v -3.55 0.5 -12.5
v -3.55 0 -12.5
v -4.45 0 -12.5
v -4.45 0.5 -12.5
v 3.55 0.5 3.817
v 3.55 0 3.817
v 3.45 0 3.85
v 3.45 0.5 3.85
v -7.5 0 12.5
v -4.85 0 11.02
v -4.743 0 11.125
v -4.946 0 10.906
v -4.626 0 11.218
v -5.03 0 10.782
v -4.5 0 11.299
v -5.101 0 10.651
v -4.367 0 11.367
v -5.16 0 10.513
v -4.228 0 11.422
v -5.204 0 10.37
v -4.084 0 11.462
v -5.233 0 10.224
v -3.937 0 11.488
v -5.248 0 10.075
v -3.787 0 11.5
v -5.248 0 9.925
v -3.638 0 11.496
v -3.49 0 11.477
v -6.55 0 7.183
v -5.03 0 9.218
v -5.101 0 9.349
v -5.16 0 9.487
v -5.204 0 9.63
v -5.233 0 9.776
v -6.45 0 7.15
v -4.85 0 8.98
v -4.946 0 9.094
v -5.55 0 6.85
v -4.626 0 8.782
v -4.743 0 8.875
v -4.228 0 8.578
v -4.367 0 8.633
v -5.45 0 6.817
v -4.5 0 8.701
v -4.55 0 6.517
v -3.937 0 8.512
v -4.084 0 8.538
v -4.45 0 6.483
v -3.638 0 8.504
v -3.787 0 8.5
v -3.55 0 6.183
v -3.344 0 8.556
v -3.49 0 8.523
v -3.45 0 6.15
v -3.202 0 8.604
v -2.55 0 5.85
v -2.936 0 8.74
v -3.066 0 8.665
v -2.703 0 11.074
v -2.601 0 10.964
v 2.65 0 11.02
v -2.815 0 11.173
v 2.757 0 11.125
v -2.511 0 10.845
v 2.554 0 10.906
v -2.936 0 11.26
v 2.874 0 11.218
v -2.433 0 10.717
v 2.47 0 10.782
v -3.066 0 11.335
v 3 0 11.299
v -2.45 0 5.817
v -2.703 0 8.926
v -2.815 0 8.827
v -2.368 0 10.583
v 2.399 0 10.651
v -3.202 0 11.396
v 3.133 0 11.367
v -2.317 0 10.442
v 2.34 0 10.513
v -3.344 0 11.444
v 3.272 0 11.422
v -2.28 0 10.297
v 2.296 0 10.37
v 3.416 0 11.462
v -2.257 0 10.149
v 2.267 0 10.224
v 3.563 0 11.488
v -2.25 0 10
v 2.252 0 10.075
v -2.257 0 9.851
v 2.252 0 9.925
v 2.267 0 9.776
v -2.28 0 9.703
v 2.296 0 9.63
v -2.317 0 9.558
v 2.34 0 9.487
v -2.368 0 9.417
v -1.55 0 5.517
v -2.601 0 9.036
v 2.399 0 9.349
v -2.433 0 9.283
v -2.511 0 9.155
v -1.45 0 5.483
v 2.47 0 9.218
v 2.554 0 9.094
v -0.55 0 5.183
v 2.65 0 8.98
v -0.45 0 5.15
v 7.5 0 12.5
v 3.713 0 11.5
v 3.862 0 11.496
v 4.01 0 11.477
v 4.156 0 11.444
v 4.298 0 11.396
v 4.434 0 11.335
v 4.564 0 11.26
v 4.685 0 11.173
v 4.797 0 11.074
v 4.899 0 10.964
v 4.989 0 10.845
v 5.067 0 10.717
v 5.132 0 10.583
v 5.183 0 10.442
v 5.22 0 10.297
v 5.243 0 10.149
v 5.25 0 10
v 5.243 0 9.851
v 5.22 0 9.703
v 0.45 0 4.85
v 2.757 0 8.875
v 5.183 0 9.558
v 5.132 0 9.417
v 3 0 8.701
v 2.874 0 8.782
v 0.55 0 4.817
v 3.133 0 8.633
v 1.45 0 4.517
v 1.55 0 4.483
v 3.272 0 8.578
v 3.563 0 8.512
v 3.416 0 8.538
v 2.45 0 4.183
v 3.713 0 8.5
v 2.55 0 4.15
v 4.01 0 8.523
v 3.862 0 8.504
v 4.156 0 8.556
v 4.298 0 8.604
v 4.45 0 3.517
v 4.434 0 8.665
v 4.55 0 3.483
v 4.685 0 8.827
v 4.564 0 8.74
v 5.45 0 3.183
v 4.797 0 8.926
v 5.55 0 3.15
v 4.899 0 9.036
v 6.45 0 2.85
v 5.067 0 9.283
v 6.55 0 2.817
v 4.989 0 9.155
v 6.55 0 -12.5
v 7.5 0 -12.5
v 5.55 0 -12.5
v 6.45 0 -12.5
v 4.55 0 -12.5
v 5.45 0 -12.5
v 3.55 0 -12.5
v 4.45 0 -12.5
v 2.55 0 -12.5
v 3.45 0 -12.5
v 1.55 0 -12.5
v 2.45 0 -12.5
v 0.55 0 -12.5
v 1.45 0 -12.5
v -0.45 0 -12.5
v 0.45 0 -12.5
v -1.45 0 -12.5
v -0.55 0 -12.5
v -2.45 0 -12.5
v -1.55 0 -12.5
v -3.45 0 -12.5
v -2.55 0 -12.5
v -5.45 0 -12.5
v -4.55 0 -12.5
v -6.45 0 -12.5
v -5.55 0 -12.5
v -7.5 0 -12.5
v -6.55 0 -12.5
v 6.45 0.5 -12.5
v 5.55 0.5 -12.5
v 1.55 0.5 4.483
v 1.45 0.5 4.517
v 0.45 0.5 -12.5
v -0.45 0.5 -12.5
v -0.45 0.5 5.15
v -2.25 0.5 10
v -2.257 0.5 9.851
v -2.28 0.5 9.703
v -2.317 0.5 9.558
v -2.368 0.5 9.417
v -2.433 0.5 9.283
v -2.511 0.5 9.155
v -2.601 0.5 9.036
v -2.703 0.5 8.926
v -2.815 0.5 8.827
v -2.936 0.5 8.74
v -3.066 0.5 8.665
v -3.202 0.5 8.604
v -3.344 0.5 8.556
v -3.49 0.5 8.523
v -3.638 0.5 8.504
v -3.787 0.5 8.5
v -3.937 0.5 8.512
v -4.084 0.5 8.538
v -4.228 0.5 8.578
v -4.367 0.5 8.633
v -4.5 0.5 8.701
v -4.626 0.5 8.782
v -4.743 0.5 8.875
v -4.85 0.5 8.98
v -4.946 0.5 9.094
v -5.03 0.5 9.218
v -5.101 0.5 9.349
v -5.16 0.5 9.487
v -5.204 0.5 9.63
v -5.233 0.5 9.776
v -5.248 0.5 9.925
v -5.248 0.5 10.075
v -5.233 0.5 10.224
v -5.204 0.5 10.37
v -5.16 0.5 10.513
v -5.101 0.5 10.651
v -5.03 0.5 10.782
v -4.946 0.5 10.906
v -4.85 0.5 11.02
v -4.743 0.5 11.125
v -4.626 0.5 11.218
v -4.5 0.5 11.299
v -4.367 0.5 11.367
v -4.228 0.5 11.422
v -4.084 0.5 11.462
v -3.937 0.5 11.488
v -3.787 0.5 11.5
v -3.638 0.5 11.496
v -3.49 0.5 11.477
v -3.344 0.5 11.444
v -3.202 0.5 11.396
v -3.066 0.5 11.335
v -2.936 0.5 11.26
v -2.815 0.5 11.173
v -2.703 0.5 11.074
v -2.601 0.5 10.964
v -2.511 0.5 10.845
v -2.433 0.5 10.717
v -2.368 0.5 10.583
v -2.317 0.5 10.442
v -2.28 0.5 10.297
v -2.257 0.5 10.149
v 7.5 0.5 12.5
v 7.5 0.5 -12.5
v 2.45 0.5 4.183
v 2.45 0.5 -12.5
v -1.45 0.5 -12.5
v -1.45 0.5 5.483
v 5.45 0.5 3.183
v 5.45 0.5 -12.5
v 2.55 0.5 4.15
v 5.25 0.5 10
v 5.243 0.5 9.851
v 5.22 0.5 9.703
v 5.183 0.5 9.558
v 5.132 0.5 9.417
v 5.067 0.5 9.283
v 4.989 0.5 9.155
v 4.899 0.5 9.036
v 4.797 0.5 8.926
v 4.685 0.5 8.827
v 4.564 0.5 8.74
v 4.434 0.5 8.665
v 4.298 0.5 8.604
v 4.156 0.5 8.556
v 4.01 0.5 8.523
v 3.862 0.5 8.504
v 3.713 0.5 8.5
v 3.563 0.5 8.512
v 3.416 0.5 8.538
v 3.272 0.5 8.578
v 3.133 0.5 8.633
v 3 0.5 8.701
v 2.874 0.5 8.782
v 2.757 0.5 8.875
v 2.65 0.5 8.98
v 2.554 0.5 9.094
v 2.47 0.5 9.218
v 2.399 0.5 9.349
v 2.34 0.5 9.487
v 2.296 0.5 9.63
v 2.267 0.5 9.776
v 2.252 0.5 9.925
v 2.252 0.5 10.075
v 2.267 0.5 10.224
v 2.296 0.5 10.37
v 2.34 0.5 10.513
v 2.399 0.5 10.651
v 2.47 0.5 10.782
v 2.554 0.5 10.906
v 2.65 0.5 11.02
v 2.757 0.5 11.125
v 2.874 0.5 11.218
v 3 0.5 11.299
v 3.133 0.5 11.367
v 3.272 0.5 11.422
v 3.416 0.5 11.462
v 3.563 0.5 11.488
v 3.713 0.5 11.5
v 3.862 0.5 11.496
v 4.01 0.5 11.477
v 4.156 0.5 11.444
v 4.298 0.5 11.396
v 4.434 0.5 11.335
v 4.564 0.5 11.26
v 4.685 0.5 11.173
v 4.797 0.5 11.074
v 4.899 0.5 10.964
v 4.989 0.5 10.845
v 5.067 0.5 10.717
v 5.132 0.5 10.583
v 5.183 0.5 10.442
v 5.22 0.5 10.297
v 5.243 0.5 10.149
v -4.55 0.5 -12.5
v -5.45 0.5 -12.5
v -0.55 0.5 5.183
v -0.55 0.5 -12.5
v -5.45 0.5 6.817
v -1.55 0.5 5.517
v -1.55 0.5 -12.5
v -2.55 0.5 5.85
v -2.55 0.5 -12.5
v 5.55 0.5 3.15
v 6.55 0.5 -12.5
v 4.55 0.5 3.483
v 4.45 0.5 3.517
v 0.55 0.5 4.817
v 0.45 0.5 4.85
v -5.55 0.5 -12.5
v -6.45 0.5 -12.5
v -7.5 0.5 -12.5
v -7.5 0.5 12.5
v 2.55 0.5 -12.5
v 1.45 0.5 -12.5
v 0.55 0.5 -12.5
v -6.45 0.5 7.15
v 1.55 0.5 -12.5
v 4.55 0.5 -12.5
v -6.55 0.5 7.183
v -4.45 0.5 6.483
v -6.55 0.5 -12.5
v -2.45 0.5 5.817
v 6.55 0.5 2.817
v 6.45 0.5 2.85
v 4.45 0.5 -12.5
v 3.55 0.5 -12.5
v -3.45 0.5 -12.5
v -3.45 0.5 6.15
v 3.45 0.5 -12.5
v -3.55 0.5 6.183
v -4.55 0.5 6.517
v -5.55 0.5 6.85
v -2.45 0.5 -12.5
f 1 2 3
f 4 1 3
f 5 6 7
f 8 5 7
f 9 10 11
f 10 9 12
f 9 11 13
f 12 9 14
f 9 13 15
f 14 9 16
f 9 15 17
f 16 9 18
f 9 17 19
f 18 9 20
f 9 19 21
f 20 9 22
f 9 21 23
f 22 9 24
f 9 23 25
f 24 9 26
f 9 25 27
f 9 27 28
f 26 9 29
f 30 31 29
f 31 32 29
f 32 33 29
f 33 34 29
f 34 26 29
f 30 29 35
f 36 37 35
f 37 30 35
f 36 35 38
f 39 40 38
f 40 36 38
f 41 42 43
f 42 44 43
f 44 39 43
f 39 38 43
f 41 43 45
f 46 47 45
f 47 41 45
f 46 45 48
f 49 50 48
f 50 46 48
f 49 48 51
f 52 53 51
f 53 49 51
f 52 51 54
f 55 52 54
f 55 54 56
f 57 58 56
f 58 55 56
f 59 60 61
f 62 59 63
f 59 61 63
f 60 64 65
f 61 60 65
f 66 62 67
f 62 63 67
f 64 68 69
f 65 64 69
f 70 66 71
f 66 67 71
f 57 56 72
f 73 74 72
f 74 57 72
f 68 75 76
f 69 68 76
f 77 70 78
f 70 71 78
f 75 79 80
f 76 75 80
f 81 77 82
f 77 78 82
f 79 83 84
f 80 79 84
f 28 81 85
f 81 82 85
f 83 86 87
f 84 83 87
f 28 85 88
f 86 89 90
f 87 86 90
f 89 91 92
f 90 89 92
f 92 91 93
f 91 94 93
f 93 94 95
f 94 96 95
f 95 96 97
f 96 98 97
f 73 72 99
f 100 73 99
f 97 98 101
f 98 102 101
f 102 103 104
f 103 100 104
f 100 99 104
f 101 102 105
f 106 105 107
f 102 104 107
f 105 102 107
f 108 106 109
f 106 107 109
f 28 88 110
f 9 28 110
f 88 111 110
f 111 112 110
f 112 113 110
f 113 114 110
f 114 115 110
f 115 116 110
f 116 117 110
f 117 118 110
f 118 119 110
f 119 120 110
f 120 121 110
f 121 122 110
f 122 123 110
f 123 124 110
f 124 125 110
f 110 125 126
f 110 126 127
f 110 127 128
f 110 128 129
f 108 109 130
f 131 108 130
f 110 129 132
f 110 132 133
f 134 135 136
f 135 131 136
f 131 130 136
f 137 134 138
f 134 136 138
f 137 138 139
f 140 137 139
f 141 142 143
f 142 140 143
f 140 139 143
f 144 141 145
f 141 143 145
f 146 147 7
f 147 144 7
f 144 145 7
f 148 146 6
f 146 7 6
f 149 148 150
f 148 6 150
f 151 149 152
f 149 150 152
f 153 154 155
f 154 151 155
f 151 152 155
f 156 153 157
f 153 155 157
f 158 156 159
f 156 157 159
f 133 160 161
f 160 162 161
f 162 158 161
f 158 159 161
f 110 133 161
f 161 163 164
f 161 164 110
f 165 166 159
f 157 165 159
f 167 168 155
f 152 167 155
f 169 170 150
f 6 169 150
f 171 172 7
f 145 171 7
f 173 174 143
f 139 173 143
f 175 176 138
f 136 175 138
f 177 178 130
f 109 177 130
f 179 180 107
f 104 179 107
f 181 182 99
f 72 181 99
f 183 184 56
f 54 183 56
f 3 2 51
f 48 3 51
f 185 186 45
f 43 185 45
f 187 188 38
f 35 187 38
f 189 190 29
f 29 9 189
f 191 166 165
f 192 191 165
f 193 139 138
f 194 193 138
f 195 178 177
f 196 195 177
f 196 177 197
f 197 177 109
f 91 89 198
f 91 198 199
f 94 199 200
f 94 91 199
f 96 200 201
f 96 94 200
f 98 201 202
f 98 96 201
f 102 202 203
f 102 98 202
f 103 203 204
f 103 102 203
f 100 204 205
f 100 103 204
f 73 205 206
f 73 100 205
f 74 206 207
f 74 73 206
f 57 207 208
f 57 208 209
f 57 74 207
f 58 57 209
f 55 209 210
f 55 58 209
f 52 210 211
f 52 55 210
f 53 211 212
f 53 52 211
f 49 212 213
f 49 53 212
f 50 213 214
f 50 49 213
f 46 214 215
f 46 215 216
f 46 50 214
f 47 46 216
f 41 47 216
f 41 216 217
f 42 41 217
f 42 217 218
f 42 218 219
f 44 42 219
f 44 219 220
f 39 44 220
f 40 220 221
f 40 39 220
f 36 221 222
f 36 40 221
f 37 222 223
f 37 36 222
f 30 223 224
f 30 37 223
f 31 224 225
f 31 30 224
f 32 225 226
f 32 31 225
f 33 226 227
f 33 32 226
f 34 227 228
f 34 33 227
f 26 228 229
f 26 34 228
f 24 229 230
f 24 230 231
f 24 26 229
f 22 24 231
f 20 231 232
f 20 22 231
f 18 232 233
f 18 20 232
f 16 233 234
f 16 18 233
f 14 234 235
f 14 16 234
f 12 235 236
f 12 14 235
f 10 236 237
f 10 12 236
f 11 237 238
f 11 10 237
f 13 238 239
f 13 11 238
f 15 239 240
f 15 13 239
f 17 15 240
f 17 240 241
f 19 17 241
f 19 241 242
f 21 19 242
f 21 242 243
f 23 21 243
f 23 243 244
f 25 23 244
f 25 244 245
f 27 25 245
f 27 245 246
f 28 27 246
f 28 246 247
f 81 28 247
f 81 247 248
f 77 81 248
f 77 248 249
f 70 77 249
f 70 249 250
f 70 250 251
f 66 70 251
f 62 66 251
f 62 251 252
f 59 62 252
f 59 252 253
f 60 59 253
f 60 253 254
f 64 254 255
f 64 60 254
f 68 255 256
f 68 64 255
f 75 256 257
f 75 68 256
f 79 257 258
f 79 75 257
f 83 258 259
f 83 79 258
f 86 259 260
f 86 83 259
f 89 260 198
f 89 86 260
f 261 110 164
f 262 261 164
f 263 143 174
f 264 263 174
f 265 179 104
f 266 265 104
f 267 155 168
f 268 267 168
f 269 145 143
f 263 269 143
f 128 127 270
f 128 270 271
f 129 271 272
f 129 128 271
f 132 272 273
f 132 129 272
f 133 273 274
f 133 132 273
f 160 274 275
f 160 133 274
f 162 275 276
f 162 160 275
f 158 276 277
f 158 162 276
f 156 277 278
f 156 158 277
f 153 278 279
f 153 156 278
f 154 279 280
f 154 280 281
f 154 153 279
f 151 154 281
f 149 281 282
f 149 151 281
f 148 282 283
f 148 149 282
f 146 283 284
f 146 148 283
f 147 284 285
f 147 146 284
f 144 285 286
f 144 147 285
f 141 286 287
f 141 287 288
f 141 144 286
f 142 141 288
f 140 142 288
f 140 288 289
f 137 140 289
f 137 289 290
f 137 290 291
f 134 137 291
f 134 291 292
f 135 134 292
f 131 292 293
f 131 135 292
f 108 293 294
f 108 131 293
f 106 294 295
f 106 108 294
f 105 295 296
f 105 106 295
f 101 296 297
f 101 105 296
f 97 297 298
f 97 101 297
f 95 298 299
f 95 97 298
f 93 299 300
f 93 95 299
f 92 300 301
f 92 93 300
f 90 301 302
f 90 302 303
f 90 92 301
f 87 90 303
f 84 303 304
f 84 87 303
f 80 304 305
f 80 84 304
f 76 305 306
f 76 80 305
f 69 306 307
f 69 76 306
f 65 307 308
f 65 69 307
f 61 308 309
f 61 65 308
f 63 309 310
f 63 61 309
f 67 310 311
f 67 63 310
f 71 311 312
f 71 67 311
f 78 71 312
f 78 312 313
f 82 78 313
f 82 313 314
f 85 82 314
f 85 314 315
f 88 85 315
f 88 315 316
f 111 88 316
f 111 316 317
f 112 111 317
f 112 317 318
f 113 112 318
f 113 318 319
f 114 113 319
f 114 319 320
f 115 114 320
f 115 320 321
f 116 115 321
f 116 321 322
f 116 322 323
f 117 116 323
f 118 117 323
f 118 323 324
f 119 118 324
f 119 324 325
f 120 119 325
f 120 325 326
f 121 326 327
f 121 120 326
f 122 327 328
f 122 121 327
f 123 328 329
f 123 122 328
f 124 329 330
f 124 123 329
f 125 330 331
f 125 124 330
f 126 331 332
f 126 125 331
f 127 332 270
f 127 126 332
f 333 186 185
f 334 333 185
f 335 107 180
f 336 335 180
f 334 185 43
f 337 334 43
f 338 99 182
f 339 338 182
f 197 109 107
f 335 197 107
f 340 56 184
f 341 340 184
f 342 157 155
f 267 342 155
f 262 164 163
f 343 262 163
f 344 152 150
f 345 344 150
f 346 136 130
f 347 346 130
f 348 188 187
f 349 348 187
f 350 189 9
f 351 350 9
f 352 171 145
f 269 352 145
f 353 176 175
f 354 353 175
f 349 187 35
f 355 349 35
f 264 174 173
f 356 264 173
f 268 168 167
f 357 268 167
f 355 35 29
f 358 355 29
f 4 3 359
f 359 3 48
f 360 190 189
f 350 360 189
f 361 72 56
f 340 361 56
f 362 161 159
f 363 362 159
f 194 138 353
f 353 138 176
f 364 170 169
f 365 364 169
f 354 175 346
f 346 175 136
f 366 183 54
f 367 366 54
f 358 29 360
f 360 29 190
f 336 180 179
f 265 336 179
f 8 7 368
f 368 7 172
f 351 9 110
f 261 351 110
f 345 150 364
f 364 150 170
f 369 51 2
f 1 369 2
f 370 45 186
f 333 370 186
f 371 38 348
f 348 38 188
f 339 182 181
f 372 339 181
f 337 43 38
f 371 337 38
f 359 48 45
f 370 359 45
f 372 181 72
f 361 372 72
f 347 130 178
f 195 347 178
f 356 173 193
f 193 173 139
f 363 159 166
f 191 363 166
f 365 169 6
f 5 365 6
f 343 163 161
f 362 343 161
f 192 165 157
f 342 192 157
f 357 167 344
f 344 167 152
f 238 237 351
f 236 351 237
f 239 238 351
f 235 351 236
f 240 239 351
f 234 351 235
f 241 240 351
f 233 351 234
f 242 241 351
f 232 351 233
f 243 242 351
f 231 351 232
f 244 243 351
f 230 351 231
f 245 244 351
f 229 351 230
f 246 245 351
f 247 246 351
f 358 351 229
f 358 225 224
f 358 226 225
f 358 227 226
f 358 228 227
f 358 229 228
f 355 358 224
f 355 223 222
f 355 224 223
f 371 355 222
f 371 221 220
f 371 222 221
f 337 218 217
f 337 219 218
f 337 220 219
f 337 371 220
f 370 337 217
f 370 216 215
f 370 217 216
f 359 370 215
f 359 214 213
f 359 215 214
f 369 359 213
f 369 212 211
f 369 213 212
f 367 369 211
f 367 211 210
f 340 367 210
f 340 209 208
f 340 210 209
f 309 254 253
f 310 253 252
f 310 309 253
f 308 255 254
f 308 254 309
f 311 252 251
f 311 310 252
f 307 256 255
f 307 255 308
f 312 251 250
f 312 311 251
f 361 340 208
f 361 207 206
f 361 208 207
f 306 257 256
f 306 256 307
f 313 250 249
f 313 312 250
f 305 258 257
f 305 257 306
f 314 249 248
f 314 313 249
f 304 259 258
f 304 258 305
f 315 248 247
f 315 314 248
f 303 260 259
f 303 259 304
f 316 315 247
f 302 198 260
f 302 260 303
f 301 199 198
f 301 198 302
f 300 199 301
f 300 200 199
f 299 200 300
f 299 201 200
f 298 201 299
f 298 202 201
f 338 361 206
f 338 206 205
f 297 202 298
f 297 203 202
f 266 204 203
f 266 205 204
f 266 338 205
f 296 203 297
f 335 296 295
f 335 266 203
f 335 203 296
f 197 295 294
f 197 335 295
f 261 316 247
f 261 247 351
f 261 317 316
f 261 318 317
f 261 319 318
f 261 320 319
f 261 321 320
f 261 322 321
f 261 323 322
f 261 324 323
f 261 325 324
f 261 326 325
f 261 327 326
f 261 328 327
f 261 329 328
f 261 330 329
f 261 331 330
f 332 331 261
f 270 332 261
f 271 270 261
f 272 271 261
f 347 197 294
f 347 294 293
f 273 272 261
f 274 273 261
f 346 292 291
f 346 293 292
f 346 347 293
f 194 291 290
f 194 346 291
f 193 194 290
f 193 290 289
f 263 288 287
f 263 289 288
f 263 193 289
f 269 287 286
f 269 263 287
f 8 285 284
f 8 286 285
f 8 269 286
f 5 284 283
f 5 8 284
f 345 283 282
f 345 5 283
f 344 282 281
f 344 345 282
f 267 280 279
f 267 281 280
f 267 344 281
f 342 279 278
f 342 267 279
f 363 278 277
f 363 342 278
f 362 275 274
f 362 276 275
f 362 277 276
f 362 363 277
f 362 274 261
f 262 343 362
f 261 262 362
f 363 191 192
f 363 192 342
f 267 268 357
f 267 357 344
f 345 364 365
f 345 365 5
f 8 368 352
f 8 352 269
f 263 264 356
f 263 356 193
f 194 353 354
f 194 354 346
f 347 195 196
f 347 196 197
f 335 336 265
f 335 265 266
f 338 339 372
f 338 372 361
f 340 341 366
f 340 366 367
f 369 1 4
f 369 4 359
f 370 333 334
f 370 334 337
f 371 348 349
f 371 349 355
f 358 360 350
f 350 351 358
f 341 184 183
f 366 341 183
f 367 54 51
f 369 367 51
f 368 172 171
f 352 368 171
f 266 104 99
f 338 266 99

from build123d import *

# Parameters (mm, degrees)
SKETCH1_R           = 1.5
BOSS_EXTRUDE1_DEPTH = 0.5


with BuildPart() as part:
    # Sketch1 → Boss-Extrude1 (new body)
    with BuildSketch(Plane(origin=(0, 0, 0), x_dir=(1, 0, 0), z_dir=(0, 1, 0))):
        Polygon((-6.55, -7.183333333), (-7.5, -7.5), (-7.5, -12.5), (7.5, -12.5), (7.5, -2.5), (6.55, -2.816666667), (6.45, -2.85), (5.55, -3.15), (5.45, -3.183333333), (4.55, -3.483333333), (4.45, -3.516666667), (3.55, -3.816666667), (3.45, -3.85), (2.55, -4.15), (2.45, -4.183333333), (1.55, -4.483333333), (1.45, -4.516666667), (0.55, -4.816666667), (0.45, -4.85), (-0.45, -5.15), (-0.55, -5.183333333), (-1.45, -5.483333333), (-1.55, -5.516666667), (-2.45, -5.816666667), (-2.55, -5.85), (-3.45, -6.15), (-3.55, -6.183333333), (-4.45, -6.483333333), (-4.55, -6.516666667), (-5.45, -6.816666667), (-5.55, -6.85), (-6.45, -7.15), align=None)
        with Locations((-3.75, -10)):
            Circle(SKETCH1_R, mode=Mode.SUBTRACT)
        with Locations((3.75, -10)):
            Circle(SKETCH1_R, mode=Mode.SUBTRACT)
        Polygon((6.55, -2.816666667), (7.5, -2.5), (7.5, 12.5), (6.55, 12.5), align=None)
        Polygon((5.55, -3.15), (6.45, -2.85), (6.45, 12.5), (5.55, 12.5), align=None)
        Polygon((4.55, -3.483333333), (5.45, -3.183333333), (5.45, 12.5), (4.55, 12.5), align=None)
        Polygon((3.55, -3.816666667), (4.45, -3.516666667), (4.45, 12.5), (3.55, 12.5), align=None)
        Polygon((2.55, -4.15), (3.45, -3.85), (3.45, 12.5), (2.55, 12.5), align=None)
        Polygon((1.55, -4.483333333), (2.45, -4.183333333), (2.45, 12.5), (1.55, 12.5), align=None)
        Polygon((0.55, -4.816666667), (1.45, -4.516666667), (1.45, 12.5), (0.55, 12.5), align=None)
        Polygon((-0.45, 12.5), (-0.45, -5.15), (0.45, -4.85), (0.45, 12.5), align=None)
        Polygon((-1.45, 12.5), (-1.45, -5.483333333), (-0.55, -5.183333333), (-0.55, 12.5), align=None)
        Polygon((-2.45, 12.5), (-2.45, -5.816666667), (-1.55, -5.516666667), (-1.55, 12.5), align=None)
        Polygon((-3.45, 12.5), (-3.45, -6.15), (-2.55, -5.85), (-2.55, 12.5), align=None)
        Polygon((-4.45, 12.5), (-4.45, -6.483333333), (-3.55, -6.183333333), (-3.55, 12.5), align=None)
        Polygon((-5.45, 12.5), (-5.45, -6.816666667), (-4.55, -6.516666667), (-4.55, 12.5), align=None)
        Polygon((-6.45, 12.5), (-6.45, -7.15), (-5.55, -6.85), (-5.55, 12.5), align=None)
        Polygon((-7.5, 12.5), (-7.5, -7.5), (-6.55, -7.183333333), (-6.55, 12.5), align=None)
    extrude(amount=BOSS_EXTRUDE1_DEPTH)


solid = part.part
